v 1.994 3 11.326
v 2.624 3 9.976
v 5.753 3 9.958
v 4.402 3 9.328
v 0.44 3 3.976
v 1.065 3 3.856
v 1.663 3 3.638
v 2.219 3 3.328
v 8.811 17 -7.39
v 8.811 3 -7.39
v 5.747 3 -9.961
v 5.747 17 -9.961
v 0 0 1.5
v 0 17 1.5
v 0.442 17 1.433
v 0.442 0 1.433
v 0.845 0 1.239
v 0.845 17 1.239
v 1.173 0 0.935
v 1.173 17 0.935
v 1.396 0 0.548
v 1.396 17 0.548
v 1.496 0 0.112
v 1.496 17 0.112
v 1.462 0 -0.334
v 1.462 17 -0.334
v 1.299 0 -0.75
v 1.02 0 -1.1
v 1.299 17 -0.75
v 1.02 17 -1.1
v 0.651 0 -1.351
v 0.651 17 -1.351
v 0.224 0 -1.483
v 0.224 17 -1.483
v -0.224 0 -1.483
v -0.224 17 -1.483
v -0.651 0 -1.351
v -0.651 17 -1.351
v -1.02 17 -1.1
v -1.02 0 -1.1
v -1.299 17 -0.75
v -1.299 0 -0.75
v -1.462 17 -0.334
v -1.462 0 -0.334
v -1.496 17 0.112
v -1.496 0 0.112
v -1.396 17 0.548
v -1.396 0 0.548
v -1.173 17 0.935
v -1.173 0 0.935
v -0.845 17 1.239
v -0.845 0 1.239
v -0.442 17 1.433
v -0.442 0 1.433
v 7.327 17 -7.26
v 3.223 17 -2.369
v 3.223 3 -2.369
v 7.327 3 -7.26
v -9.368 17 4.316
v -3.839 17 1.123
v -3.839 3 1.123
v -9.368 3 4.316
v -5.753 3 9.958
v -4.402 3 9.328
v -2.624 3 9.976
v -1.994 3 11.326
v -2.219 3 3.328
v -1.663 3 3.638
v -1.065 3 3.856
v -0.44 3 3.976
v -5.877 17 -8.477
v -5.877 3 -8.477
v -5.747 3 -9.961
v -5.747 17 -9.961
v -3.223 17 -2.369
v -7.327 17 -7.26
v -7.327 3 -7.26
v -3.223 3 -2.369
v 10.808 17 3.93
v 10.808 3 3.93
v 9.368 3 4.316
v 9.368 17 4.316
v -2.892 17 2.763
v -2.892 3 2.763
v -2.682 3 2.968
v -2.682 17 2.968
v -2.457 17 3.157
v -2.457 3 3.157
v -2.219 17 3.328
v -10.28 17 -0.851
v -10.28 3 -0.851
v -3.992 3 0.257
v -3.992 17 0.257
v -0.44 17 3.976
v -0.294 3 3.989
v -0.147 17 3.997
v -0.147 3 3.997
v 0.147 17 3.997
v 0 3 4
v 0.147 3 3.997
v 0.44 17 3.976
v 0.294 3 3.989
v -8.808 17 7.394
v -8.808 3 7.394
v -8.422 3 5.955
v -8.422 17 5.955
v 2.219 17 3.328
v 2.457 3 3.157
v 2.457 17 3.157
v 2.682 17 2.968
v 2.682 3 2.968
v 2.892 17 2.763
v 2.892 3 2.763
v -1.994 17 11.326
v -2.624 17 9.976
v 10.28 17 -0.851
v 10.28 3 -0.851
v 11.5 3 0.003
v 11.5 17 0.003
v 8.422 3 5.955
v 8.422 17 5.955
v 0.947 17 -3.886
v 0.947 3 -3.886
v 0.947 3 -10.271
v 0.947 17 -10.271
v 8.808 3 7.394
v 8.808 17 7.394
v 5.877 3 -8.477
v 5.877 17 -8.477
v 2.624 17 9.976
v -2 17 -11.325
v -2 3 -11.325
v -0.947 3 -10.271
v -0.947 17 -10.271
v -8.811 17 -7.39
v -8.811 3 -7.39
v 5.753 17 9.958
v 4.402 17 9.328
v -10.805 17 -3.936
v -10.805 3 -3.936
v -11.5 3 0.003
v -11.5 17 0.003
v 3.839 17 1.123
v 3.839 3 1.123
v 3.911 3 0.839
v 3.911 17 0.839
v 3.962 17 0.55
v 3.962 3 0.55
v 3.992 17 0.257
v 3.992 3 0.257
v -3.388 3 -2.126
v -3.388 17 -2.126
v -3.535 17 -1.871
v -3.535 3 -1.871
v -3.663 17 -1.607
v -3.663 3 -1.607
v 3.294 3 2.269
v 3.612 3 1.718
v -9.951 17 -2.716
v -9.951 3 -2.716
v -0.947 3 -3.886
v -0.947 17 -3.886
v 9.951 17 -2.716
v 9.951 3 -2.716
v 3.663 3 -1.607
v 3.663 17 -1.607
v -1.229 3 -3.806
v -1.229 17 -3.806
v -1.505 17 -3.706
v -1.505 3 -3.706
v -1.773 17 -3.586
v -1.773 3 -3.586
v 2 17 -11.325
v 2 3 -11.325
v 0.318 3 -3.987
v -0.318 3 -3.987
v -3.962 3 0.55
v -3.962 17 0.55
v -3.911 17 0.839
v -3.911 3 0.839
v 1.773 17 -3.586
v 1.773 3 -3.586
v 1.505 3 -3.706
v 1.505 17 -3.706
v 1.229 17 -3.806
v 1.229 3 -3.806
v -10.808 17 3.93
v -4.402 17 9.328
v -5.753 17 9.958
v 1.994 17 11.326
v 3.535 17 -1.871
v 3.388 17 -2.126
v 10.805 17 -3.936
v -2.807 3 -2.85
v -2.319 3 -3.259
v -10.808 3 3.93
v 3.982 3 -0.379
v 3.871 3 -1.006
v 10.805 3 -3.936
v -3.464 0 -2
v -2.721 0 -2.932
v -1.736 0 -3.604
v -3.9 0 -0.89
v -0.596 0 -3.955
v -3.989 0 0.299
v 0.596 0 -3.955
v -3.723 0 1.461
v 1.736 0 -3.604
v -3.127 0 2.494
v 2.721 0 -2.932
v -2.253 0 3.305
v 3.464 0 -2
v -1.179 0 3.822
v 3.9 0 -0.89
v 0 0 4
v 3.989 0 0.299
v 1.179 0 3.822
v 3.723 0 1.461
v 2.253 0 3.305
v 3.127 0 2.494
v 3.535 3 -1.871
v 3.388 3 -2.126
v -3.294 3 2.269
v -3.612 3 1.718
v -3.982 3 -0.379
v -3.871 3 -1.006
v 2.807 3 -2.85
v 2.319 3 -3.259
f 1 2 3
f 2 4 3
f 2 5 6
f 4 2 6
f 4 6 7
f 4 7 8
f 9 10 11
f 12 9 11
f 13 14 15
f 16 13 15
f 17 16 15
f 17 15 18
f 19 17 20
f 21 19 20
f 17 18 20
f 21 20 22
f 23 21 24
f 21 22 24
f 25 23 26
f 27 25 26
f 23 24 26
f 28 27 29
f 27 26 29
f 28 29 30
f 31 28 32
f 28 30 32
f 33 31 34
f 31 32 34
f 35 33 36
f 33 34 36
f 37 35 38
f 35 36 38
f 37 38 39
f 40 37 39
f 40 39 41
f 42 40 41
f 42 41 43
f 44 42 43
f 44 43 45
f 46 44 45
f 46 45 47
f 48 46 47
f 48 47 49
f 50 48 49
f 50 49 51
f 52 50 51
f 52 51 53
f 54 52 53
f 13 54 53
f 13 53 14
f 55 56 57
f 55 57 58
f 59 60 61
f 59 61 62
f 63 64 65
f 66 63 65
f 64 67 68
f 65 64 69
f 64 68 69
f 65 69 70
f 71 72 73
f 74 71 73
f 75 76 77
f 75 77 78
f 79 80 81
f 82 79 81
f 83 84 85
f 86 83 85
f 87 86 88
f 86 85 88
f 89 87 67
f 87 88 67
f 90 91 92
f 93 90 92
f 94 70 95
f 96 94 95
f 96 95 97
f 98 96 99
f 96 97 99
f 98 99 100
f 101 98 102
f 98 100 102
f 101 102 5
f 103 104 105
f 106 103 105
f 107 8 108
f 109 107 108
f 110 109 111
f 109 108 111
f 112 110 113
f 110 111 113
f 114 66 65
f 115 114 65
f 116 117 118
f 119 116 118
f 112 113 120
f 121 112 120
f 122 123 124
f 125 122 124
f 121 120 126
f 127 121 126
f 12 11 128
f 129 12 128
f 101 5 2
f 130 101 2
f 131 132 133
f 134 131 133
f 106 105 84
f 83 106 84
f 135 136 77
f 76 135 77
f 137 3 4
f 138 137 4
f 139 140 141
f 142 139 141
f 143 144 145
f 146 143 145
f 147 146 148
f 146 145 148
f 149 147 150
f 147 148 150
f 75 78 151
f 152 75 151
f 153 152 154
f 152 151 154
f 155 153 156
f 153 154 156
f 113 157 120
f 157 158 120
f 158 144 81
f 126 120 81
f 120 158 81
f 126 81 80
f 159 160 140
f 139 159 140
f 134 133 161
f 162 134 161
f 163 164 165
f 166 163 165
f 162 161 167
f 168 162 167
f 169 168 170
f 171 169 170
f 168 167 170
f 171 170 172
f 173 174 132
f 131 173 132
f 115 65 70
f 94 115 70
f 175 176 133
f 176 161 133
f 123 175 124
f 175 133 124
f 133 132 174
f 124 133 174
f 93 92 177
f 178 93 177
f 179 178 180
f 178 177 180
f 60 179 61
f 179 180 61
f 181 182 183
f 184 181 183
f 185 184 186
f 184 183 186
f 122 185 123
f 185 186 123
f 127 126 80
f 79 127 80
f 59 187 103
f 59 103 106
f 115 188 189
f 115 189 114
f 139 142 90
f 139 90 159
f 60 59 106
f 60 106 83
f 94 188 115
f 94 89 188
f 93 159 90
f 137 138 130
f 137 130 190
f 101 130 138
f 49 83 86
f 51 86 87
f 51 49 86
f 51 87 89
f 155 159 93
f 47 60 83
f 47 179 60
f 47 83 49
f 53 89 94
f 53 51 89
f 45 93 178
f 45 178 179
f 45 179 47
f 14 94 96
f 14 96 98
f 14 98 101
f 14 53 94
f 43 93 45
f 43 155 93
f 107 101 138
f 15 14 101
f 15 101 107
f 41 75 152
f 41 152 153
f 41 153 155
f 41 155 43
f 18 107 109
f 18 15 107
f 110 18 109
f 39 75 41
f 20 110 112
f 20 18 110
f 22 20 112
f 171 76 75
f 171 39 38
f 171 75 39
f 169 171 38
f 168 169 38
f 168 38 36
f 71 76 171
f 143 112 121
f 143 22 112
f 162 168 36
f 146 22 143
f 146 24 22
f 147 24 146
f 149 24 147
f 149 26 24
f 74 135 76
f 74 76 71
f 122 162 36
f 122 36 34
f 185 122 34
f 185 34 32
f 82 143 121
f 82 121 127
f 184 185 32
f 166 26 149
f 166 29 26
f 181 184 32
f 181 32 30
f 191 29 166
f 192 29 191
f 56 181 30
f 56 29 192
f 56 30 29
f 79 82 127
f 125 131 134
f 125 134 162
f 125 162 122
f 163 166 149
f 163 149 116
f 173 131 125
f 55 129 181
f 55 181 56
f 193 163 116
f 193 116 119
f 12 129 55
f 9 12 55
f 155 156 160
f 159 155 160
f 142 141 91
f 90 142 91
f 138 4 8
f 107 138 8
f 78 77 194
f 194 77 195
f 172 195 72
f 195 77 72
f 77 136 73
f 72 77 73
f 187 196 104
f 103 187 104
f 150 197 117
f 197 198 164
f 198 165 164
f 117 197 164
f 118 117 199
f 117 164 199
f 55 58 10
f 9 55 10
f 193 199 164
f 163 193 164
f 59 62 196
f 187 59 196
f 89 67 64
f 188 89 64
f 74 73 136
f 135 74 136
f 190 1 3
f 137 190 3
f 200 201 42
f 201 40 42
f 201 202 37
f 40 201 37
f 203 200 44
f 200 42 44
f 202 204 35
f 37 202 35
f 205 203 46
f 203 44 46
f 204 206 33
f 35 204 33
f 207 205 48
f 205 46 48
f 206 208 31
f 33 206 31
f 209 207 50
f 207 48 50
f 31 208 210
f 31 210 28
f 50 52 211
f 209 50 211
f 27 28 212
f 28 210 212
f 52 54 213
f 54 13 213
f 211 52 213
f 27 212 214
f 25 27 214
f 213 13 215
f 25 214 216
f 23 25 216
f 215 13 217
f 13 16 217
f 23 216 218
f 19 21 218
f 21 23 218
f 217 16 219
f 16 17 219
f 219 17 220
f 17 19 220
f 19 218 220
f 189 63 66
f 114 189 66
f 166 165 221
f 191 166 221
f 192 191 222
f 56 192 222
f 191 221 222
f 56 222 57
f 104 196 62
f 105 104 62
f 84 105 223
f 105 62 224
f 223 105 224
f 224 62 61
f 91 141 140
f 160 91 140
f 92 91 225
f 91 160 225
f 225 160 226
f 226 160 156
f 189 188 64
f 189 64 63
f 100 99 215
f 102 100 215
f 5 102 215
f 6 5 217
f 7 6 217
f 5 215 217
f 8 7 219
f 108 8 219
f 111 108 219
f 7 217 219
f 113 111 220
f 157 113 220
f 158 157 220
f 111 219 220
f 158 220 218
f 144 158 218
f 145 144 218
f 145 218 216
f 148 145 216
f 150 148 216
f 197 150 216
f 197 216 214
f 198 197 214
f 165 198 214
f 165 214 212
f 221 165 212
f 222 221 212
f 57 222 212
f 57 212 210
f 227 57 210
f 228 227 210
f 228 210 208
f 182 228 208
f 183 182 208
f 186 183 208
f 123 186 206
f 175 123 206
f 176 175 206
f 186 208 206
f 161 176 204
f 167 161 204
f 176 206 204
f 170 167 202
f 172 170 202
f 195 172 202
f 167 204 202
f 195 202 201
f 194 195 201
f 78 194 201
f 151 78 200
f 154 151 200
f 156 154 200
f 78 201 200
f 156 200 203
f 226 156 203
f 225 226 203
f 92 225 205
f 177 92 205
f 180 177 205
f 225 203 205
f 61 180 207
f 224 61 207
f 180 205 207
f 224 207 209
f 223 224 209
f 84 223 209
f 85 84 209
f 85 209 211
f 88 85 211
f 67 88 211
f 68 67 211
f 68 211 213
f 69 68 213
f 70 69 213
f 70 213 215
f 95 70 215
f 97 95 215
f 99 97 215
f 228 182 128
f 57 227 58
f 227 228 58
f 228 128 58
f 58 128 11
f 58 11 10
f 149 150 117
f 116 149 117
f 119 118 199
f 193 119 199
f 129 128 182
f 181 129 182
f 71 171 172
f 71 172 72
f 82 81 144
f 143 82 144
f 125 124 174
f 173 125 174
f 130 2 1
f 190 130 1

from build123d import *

# Parameters (mm, degrees)
SCHIZZO1_R                   = 4
ESTRUSIONE_ESTRUSIONE1_DEPTH = 3
ESTRUSIONE_ESTRUSIONE2_DEPTH = 14
SCHIZZO3_R                   = 1.5
TAGLIO_ESTRUSIONE1_DEPTH     = 32


with BuildPart() as part:
    # Schizzo1 → Estrusione-Estrusione1 (new body)
    with BuildSketch(Plane(origin=(0, 0, 0), x_dir=(1, 0, 0), z_dir=(0, 1, 0))):
        with Locations(Location((0, 0, 0), (0, 0, 270))):
            Circle(SCHIZZO1_R)
    extrude(amount=ESTRUSIONE_ESTRUSIONE1_DEPTH)

    # Schizzo2 → Estrusione-Estrusione2 (add)
    with BuildSketch(Plane(origin=(0, 3, 0), x_dir=(1, 0, 0), z_dir=(0, 1, 0))):
        with BuildLine():
            Line((5.877166346, 8.476701011), (1.77302735, 3.585578617))
            ThreePointArc((1.77302735, 3.585578617), (1.368080573, 3.758770483), (0.94654776, 3.886392587))
            Line((0.94654776, 3.886392587), (0.94654776, 10.271299413))
            Line((0.94654776, 10.271299413), (2, 11.324751653))
            Line((2, 11.324751653), (-2, 11.324751653))
            Line((-2, 11.324751653), (-0.94654776, 10.271299413))
            Line((-0.94654776, 10.271299413), (-0.94654776, 3.886392587))
            ThreePointArc((-0.94654776, 3.886392587), (-1.368080573, 3.758770483), (-1.77302735, 3.585578617))
            Line((-1.77302735, 3.585578617), (-5.877166346, 8.476701011))
            Line((-5.877166346, 8.476701011), (-5.747321159, 9.960838293))
            Line((-5.747321159, 9.960838293), (-8.811498932, 7.389687854))
            Line((-8.811498932, 7.389687854), (-7.327361649, 7.259842667))
            Line((-7.327361649, 7.259842667), (-3.223222653, 2.368720273))
            ThreePointArc((-3.223222653, 2.368720273), (-3.464101615, 2), (-3.662983257, 1.607032563))
            Line((-3.662983257, 1.607032563), (-9.950889001, 2.715759998))
            Line((-9.950889001, 2.715759998), (-10.805406873, 3.936137993))
            Line((-10.805406873, 3.936137993), (-11.499999584, -0.003093019))
            Line((-11.499999584, -0.003093019), (-10.279621589, 0.851424853))
            Line((-10.279621589, 0.851424853), (-3.991715844, -0.257302582))
            ThreePointArc((-3.991715844, -0.257302582), (-3.939231012, -0.694592711), (-3.838988589, -1.123461888))
            Line((-3.838988589, -1.123461888), (-9.368480101, -4.315915301))
            Line((-9.368480101, -4.315915301), (-10.807522623, -3.930325019))
            Line((-10.807522623, -3.930325019), (-8.807522623, -7.394426634))
            Line((-8.807522623, -7.394426634), (-8.421932341, -5.955384112))
            Line((-8.421932341, -5.955384112), (-2.892440829, -2.762930699))
            ThreePointArc((-2.892440829, -2.762930699), (-2.571150439, -3.064177772), (-2.218688495, -3.328276035))
            Line((-2.218688495, -3.328276035), (-4.402455242, -9.328125863))
            Line((-4.402455242, -9.328125863), (-5.752678425, -9.957745274))
            Line((-5.752678425, -9.957745274), (-1.993907942, -11.325825847))
            Line((-1.993907942, -11.325825847), (-2.623527352, -9.975602664))
            Line((-2.623527352, -9.975602664), (-0.439760605, -3.975752836))
            ThreePointArc((-0.439760605, -3.975752836), (0, -4), (0.439760605, -3.975752836))
            Line((0.439760605, -3.975752836), (2.623527352, -9.975602664))
            Line((2.623527352, -9.975602664), (1.993907942, -11.325825847))
            Line((1.993907942, -11.325825847), (5.752678425, -9.957745274))
            Line((5.752678425, -9.957745274), (4.402455242, -9.328125863))
            Line((4.402455242, -9.328125863), (2.218688495, -3.328276035))
            ThreePointArc((2.218688495, -3.328276035), (2.571150439, -3.064177772), (2.892440829, -2.762930699))
            Line((2.892440829, -2.762930699), (8.421932341, -5.955384112))
            Line((8.421932341, -5.955384112), (8.807522623, -7.394426634))
            Line((8.807522623, -7.394426634), (10.807522623, -3.930325019))
            Line((10.807522623, -3.930325019), (9.368480101, -4.315915301))
            Line((9.368480101, -4.315915301), (3.838988589, -1.123461888))
            ThreePointArc((3.838988589, -1.123461888), (3.939231012, -0.694592711), (3.991715844, -0.257302582))
            Line((3.991715844, -0.257302582), (10.279621589, 0.851424853))
            Line((10.279621589, 0.851424853), (11.499999584, -0.003093019))
            Line((11.499999584, -0.003093019), (10.805406873, 3.936137993))
            Line((10.805406873, 3.936137993), (9.950889001, 2.715759998))
            Line((9.950889001, 2.715759998), (3.662983257, 1.607032563))
            ThreePointArc((3.662983257, 1.607032563), (3.464101615, 2), (3.223222653, 2.368720273))
            Line((3.223222653, 2.368720273), (7.327361649, 7.259842667))
            Line((7.327361649, 7.259842667), (8.811498932, 7.389687854))
            Line((8.811498932, 7.389687854), (5.747321159, 9.960838293))
            Line((5.747321159, 9.960838293), (5.877166346, 8.476701011))
        make_face()
    extrude(amount=ESTRUSIONE_ESTRUSIONE2_DEPTH)

    # Schizzo3 → Taglio-Estrusione1 (cut)
    with BuildSketch(Plane(origin=(0, 17, 0), x_dir=(1, 0, 0), z_dir=(0, 1, 0))):
        with Locations(Location((0, 0, 0), (0, 0, 270))):
            Circle(SCHIZZO3_R)
    extrude(amount=-TAGLIO_ESTRUSIONE1_DEPTH, mode=Mode.SUBTRACT)


solid = part.part
